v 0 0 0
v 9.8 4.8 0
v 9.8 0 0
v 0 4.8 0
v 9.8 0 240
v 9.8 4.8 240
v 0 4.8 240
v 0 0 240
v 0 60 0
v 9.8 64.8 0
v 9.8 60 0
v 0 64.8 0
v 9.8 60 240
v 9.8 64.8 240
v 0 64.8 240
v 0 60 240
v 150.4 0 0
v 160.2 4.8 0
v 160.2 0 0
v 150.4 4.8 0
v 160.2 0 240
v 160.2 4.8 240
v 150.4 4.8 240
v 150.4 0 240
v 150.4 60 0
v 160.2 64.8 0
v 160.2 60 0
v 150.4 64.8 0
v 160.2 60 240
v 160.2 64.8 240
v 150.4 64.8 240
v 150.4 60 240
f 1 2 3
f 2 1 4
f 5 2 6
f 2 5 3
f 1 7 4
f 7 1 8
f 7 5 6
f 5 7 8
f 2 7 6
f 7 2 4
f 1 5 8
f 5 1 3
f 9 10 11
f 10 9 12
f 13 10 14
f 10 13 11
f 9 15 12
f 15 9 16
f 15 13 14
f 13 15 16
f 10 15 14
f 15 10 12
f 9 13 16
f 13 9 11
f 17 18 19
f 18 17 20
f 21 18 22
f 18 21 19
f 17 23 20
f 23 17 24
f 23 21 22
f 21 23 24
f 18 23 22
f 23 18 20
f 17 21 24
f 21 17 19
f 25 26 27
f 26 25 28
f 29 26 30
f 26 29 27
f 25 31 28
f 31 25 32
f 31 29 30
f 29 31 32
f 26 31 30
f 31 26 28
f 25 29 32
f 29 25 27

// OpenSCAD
// file: materials.scad
module twobyfour(length) {
    echo("2x4: ", length);
    color("BurlyWood")
    cube([length, 4.8, 9.8]);   
}

module twobytwo(length) {
    echo("2x2: ", length);
    color("BurlyWood")
    cube([length, 4.8, 4.8]);   
}

module lekt30x48(length) {
    echo ("30x48: ", length);
    color("Burlywood")
    cube([length, 3.0, 4.8]);
}

module lekt36x48(length) {
    echo ("36x48: ", length);
    color("Burlywood")
    cube([length, 4.8, 4.8]);
}

module lekt48x48(length) {
    echo ("48x48: ", length);
    color("Burlywood")
    cube([length, 4.8, 4.8]);
}
// main file
use <materials.scad>;

module endshelves(width=160, height=240, depth=60) {
    /*twobyfour(width);
    translate([0, -60, 0])
        twobyfour(width);
    */
    translate([0, 0, height]) {
        rotate([0, 90, 0]){
            twobyfour(height);
            translate([0, depth, 0])
            twobyfour(height);
        }
        translate([width - 9.6, 0, 0])
        rotate([0, 90, 0]){
            twobyfour(height);
            translate([0, depth, 0])
            twobyfour(height);
        }
    }
}

module bench(width=230, height=90, depth=70) {
    segments = 3;
    translate([0, 0, height - 9.6]) {
        // Top
        twobyfour(230);
        translate([0, depth  - 4.8, 0])
        twobyfour(230);

        // Supports
        translate([0, 4.8, 9.6]) {
            segment_spacing = (width - 9.6) / (segments - 1);
            for(i = [0:segments - 1]) {
                translate([i * segment_spacing, 0, 0]) {
                    rotate([0, 90, 0]) {
                        twobyfour(height);
                        translate([0, depth - 3 * 4.8, 0])
                            twobyfour(height);
                    }
                    translate([4.8 * 1.5, 4.8, - 70])
                        rotate([0, 0, 90])
                            twobyfour(depth - 4 * 4.8);
                    
                    translate([0, 4.8, -4.8])
                        rotate([90, 0, 90])
                            twobyfour(depth - 4 * 4.8);
                    
                }
            }
        }

        // Top plate
        translate([0, 0, 9.6])
            cube([width, depth, 1.2]);
    }
}


/*translate([60, 0, 0])
    bench();
*/

//translate([290 + 4.8, 0, 0])
//    rotate([0, 0, 90])
        endshelves(160);
/*
translate([4.8, 4.8, 0])
    rotate([0, 0, 90])
        endshelves(100);
*/
